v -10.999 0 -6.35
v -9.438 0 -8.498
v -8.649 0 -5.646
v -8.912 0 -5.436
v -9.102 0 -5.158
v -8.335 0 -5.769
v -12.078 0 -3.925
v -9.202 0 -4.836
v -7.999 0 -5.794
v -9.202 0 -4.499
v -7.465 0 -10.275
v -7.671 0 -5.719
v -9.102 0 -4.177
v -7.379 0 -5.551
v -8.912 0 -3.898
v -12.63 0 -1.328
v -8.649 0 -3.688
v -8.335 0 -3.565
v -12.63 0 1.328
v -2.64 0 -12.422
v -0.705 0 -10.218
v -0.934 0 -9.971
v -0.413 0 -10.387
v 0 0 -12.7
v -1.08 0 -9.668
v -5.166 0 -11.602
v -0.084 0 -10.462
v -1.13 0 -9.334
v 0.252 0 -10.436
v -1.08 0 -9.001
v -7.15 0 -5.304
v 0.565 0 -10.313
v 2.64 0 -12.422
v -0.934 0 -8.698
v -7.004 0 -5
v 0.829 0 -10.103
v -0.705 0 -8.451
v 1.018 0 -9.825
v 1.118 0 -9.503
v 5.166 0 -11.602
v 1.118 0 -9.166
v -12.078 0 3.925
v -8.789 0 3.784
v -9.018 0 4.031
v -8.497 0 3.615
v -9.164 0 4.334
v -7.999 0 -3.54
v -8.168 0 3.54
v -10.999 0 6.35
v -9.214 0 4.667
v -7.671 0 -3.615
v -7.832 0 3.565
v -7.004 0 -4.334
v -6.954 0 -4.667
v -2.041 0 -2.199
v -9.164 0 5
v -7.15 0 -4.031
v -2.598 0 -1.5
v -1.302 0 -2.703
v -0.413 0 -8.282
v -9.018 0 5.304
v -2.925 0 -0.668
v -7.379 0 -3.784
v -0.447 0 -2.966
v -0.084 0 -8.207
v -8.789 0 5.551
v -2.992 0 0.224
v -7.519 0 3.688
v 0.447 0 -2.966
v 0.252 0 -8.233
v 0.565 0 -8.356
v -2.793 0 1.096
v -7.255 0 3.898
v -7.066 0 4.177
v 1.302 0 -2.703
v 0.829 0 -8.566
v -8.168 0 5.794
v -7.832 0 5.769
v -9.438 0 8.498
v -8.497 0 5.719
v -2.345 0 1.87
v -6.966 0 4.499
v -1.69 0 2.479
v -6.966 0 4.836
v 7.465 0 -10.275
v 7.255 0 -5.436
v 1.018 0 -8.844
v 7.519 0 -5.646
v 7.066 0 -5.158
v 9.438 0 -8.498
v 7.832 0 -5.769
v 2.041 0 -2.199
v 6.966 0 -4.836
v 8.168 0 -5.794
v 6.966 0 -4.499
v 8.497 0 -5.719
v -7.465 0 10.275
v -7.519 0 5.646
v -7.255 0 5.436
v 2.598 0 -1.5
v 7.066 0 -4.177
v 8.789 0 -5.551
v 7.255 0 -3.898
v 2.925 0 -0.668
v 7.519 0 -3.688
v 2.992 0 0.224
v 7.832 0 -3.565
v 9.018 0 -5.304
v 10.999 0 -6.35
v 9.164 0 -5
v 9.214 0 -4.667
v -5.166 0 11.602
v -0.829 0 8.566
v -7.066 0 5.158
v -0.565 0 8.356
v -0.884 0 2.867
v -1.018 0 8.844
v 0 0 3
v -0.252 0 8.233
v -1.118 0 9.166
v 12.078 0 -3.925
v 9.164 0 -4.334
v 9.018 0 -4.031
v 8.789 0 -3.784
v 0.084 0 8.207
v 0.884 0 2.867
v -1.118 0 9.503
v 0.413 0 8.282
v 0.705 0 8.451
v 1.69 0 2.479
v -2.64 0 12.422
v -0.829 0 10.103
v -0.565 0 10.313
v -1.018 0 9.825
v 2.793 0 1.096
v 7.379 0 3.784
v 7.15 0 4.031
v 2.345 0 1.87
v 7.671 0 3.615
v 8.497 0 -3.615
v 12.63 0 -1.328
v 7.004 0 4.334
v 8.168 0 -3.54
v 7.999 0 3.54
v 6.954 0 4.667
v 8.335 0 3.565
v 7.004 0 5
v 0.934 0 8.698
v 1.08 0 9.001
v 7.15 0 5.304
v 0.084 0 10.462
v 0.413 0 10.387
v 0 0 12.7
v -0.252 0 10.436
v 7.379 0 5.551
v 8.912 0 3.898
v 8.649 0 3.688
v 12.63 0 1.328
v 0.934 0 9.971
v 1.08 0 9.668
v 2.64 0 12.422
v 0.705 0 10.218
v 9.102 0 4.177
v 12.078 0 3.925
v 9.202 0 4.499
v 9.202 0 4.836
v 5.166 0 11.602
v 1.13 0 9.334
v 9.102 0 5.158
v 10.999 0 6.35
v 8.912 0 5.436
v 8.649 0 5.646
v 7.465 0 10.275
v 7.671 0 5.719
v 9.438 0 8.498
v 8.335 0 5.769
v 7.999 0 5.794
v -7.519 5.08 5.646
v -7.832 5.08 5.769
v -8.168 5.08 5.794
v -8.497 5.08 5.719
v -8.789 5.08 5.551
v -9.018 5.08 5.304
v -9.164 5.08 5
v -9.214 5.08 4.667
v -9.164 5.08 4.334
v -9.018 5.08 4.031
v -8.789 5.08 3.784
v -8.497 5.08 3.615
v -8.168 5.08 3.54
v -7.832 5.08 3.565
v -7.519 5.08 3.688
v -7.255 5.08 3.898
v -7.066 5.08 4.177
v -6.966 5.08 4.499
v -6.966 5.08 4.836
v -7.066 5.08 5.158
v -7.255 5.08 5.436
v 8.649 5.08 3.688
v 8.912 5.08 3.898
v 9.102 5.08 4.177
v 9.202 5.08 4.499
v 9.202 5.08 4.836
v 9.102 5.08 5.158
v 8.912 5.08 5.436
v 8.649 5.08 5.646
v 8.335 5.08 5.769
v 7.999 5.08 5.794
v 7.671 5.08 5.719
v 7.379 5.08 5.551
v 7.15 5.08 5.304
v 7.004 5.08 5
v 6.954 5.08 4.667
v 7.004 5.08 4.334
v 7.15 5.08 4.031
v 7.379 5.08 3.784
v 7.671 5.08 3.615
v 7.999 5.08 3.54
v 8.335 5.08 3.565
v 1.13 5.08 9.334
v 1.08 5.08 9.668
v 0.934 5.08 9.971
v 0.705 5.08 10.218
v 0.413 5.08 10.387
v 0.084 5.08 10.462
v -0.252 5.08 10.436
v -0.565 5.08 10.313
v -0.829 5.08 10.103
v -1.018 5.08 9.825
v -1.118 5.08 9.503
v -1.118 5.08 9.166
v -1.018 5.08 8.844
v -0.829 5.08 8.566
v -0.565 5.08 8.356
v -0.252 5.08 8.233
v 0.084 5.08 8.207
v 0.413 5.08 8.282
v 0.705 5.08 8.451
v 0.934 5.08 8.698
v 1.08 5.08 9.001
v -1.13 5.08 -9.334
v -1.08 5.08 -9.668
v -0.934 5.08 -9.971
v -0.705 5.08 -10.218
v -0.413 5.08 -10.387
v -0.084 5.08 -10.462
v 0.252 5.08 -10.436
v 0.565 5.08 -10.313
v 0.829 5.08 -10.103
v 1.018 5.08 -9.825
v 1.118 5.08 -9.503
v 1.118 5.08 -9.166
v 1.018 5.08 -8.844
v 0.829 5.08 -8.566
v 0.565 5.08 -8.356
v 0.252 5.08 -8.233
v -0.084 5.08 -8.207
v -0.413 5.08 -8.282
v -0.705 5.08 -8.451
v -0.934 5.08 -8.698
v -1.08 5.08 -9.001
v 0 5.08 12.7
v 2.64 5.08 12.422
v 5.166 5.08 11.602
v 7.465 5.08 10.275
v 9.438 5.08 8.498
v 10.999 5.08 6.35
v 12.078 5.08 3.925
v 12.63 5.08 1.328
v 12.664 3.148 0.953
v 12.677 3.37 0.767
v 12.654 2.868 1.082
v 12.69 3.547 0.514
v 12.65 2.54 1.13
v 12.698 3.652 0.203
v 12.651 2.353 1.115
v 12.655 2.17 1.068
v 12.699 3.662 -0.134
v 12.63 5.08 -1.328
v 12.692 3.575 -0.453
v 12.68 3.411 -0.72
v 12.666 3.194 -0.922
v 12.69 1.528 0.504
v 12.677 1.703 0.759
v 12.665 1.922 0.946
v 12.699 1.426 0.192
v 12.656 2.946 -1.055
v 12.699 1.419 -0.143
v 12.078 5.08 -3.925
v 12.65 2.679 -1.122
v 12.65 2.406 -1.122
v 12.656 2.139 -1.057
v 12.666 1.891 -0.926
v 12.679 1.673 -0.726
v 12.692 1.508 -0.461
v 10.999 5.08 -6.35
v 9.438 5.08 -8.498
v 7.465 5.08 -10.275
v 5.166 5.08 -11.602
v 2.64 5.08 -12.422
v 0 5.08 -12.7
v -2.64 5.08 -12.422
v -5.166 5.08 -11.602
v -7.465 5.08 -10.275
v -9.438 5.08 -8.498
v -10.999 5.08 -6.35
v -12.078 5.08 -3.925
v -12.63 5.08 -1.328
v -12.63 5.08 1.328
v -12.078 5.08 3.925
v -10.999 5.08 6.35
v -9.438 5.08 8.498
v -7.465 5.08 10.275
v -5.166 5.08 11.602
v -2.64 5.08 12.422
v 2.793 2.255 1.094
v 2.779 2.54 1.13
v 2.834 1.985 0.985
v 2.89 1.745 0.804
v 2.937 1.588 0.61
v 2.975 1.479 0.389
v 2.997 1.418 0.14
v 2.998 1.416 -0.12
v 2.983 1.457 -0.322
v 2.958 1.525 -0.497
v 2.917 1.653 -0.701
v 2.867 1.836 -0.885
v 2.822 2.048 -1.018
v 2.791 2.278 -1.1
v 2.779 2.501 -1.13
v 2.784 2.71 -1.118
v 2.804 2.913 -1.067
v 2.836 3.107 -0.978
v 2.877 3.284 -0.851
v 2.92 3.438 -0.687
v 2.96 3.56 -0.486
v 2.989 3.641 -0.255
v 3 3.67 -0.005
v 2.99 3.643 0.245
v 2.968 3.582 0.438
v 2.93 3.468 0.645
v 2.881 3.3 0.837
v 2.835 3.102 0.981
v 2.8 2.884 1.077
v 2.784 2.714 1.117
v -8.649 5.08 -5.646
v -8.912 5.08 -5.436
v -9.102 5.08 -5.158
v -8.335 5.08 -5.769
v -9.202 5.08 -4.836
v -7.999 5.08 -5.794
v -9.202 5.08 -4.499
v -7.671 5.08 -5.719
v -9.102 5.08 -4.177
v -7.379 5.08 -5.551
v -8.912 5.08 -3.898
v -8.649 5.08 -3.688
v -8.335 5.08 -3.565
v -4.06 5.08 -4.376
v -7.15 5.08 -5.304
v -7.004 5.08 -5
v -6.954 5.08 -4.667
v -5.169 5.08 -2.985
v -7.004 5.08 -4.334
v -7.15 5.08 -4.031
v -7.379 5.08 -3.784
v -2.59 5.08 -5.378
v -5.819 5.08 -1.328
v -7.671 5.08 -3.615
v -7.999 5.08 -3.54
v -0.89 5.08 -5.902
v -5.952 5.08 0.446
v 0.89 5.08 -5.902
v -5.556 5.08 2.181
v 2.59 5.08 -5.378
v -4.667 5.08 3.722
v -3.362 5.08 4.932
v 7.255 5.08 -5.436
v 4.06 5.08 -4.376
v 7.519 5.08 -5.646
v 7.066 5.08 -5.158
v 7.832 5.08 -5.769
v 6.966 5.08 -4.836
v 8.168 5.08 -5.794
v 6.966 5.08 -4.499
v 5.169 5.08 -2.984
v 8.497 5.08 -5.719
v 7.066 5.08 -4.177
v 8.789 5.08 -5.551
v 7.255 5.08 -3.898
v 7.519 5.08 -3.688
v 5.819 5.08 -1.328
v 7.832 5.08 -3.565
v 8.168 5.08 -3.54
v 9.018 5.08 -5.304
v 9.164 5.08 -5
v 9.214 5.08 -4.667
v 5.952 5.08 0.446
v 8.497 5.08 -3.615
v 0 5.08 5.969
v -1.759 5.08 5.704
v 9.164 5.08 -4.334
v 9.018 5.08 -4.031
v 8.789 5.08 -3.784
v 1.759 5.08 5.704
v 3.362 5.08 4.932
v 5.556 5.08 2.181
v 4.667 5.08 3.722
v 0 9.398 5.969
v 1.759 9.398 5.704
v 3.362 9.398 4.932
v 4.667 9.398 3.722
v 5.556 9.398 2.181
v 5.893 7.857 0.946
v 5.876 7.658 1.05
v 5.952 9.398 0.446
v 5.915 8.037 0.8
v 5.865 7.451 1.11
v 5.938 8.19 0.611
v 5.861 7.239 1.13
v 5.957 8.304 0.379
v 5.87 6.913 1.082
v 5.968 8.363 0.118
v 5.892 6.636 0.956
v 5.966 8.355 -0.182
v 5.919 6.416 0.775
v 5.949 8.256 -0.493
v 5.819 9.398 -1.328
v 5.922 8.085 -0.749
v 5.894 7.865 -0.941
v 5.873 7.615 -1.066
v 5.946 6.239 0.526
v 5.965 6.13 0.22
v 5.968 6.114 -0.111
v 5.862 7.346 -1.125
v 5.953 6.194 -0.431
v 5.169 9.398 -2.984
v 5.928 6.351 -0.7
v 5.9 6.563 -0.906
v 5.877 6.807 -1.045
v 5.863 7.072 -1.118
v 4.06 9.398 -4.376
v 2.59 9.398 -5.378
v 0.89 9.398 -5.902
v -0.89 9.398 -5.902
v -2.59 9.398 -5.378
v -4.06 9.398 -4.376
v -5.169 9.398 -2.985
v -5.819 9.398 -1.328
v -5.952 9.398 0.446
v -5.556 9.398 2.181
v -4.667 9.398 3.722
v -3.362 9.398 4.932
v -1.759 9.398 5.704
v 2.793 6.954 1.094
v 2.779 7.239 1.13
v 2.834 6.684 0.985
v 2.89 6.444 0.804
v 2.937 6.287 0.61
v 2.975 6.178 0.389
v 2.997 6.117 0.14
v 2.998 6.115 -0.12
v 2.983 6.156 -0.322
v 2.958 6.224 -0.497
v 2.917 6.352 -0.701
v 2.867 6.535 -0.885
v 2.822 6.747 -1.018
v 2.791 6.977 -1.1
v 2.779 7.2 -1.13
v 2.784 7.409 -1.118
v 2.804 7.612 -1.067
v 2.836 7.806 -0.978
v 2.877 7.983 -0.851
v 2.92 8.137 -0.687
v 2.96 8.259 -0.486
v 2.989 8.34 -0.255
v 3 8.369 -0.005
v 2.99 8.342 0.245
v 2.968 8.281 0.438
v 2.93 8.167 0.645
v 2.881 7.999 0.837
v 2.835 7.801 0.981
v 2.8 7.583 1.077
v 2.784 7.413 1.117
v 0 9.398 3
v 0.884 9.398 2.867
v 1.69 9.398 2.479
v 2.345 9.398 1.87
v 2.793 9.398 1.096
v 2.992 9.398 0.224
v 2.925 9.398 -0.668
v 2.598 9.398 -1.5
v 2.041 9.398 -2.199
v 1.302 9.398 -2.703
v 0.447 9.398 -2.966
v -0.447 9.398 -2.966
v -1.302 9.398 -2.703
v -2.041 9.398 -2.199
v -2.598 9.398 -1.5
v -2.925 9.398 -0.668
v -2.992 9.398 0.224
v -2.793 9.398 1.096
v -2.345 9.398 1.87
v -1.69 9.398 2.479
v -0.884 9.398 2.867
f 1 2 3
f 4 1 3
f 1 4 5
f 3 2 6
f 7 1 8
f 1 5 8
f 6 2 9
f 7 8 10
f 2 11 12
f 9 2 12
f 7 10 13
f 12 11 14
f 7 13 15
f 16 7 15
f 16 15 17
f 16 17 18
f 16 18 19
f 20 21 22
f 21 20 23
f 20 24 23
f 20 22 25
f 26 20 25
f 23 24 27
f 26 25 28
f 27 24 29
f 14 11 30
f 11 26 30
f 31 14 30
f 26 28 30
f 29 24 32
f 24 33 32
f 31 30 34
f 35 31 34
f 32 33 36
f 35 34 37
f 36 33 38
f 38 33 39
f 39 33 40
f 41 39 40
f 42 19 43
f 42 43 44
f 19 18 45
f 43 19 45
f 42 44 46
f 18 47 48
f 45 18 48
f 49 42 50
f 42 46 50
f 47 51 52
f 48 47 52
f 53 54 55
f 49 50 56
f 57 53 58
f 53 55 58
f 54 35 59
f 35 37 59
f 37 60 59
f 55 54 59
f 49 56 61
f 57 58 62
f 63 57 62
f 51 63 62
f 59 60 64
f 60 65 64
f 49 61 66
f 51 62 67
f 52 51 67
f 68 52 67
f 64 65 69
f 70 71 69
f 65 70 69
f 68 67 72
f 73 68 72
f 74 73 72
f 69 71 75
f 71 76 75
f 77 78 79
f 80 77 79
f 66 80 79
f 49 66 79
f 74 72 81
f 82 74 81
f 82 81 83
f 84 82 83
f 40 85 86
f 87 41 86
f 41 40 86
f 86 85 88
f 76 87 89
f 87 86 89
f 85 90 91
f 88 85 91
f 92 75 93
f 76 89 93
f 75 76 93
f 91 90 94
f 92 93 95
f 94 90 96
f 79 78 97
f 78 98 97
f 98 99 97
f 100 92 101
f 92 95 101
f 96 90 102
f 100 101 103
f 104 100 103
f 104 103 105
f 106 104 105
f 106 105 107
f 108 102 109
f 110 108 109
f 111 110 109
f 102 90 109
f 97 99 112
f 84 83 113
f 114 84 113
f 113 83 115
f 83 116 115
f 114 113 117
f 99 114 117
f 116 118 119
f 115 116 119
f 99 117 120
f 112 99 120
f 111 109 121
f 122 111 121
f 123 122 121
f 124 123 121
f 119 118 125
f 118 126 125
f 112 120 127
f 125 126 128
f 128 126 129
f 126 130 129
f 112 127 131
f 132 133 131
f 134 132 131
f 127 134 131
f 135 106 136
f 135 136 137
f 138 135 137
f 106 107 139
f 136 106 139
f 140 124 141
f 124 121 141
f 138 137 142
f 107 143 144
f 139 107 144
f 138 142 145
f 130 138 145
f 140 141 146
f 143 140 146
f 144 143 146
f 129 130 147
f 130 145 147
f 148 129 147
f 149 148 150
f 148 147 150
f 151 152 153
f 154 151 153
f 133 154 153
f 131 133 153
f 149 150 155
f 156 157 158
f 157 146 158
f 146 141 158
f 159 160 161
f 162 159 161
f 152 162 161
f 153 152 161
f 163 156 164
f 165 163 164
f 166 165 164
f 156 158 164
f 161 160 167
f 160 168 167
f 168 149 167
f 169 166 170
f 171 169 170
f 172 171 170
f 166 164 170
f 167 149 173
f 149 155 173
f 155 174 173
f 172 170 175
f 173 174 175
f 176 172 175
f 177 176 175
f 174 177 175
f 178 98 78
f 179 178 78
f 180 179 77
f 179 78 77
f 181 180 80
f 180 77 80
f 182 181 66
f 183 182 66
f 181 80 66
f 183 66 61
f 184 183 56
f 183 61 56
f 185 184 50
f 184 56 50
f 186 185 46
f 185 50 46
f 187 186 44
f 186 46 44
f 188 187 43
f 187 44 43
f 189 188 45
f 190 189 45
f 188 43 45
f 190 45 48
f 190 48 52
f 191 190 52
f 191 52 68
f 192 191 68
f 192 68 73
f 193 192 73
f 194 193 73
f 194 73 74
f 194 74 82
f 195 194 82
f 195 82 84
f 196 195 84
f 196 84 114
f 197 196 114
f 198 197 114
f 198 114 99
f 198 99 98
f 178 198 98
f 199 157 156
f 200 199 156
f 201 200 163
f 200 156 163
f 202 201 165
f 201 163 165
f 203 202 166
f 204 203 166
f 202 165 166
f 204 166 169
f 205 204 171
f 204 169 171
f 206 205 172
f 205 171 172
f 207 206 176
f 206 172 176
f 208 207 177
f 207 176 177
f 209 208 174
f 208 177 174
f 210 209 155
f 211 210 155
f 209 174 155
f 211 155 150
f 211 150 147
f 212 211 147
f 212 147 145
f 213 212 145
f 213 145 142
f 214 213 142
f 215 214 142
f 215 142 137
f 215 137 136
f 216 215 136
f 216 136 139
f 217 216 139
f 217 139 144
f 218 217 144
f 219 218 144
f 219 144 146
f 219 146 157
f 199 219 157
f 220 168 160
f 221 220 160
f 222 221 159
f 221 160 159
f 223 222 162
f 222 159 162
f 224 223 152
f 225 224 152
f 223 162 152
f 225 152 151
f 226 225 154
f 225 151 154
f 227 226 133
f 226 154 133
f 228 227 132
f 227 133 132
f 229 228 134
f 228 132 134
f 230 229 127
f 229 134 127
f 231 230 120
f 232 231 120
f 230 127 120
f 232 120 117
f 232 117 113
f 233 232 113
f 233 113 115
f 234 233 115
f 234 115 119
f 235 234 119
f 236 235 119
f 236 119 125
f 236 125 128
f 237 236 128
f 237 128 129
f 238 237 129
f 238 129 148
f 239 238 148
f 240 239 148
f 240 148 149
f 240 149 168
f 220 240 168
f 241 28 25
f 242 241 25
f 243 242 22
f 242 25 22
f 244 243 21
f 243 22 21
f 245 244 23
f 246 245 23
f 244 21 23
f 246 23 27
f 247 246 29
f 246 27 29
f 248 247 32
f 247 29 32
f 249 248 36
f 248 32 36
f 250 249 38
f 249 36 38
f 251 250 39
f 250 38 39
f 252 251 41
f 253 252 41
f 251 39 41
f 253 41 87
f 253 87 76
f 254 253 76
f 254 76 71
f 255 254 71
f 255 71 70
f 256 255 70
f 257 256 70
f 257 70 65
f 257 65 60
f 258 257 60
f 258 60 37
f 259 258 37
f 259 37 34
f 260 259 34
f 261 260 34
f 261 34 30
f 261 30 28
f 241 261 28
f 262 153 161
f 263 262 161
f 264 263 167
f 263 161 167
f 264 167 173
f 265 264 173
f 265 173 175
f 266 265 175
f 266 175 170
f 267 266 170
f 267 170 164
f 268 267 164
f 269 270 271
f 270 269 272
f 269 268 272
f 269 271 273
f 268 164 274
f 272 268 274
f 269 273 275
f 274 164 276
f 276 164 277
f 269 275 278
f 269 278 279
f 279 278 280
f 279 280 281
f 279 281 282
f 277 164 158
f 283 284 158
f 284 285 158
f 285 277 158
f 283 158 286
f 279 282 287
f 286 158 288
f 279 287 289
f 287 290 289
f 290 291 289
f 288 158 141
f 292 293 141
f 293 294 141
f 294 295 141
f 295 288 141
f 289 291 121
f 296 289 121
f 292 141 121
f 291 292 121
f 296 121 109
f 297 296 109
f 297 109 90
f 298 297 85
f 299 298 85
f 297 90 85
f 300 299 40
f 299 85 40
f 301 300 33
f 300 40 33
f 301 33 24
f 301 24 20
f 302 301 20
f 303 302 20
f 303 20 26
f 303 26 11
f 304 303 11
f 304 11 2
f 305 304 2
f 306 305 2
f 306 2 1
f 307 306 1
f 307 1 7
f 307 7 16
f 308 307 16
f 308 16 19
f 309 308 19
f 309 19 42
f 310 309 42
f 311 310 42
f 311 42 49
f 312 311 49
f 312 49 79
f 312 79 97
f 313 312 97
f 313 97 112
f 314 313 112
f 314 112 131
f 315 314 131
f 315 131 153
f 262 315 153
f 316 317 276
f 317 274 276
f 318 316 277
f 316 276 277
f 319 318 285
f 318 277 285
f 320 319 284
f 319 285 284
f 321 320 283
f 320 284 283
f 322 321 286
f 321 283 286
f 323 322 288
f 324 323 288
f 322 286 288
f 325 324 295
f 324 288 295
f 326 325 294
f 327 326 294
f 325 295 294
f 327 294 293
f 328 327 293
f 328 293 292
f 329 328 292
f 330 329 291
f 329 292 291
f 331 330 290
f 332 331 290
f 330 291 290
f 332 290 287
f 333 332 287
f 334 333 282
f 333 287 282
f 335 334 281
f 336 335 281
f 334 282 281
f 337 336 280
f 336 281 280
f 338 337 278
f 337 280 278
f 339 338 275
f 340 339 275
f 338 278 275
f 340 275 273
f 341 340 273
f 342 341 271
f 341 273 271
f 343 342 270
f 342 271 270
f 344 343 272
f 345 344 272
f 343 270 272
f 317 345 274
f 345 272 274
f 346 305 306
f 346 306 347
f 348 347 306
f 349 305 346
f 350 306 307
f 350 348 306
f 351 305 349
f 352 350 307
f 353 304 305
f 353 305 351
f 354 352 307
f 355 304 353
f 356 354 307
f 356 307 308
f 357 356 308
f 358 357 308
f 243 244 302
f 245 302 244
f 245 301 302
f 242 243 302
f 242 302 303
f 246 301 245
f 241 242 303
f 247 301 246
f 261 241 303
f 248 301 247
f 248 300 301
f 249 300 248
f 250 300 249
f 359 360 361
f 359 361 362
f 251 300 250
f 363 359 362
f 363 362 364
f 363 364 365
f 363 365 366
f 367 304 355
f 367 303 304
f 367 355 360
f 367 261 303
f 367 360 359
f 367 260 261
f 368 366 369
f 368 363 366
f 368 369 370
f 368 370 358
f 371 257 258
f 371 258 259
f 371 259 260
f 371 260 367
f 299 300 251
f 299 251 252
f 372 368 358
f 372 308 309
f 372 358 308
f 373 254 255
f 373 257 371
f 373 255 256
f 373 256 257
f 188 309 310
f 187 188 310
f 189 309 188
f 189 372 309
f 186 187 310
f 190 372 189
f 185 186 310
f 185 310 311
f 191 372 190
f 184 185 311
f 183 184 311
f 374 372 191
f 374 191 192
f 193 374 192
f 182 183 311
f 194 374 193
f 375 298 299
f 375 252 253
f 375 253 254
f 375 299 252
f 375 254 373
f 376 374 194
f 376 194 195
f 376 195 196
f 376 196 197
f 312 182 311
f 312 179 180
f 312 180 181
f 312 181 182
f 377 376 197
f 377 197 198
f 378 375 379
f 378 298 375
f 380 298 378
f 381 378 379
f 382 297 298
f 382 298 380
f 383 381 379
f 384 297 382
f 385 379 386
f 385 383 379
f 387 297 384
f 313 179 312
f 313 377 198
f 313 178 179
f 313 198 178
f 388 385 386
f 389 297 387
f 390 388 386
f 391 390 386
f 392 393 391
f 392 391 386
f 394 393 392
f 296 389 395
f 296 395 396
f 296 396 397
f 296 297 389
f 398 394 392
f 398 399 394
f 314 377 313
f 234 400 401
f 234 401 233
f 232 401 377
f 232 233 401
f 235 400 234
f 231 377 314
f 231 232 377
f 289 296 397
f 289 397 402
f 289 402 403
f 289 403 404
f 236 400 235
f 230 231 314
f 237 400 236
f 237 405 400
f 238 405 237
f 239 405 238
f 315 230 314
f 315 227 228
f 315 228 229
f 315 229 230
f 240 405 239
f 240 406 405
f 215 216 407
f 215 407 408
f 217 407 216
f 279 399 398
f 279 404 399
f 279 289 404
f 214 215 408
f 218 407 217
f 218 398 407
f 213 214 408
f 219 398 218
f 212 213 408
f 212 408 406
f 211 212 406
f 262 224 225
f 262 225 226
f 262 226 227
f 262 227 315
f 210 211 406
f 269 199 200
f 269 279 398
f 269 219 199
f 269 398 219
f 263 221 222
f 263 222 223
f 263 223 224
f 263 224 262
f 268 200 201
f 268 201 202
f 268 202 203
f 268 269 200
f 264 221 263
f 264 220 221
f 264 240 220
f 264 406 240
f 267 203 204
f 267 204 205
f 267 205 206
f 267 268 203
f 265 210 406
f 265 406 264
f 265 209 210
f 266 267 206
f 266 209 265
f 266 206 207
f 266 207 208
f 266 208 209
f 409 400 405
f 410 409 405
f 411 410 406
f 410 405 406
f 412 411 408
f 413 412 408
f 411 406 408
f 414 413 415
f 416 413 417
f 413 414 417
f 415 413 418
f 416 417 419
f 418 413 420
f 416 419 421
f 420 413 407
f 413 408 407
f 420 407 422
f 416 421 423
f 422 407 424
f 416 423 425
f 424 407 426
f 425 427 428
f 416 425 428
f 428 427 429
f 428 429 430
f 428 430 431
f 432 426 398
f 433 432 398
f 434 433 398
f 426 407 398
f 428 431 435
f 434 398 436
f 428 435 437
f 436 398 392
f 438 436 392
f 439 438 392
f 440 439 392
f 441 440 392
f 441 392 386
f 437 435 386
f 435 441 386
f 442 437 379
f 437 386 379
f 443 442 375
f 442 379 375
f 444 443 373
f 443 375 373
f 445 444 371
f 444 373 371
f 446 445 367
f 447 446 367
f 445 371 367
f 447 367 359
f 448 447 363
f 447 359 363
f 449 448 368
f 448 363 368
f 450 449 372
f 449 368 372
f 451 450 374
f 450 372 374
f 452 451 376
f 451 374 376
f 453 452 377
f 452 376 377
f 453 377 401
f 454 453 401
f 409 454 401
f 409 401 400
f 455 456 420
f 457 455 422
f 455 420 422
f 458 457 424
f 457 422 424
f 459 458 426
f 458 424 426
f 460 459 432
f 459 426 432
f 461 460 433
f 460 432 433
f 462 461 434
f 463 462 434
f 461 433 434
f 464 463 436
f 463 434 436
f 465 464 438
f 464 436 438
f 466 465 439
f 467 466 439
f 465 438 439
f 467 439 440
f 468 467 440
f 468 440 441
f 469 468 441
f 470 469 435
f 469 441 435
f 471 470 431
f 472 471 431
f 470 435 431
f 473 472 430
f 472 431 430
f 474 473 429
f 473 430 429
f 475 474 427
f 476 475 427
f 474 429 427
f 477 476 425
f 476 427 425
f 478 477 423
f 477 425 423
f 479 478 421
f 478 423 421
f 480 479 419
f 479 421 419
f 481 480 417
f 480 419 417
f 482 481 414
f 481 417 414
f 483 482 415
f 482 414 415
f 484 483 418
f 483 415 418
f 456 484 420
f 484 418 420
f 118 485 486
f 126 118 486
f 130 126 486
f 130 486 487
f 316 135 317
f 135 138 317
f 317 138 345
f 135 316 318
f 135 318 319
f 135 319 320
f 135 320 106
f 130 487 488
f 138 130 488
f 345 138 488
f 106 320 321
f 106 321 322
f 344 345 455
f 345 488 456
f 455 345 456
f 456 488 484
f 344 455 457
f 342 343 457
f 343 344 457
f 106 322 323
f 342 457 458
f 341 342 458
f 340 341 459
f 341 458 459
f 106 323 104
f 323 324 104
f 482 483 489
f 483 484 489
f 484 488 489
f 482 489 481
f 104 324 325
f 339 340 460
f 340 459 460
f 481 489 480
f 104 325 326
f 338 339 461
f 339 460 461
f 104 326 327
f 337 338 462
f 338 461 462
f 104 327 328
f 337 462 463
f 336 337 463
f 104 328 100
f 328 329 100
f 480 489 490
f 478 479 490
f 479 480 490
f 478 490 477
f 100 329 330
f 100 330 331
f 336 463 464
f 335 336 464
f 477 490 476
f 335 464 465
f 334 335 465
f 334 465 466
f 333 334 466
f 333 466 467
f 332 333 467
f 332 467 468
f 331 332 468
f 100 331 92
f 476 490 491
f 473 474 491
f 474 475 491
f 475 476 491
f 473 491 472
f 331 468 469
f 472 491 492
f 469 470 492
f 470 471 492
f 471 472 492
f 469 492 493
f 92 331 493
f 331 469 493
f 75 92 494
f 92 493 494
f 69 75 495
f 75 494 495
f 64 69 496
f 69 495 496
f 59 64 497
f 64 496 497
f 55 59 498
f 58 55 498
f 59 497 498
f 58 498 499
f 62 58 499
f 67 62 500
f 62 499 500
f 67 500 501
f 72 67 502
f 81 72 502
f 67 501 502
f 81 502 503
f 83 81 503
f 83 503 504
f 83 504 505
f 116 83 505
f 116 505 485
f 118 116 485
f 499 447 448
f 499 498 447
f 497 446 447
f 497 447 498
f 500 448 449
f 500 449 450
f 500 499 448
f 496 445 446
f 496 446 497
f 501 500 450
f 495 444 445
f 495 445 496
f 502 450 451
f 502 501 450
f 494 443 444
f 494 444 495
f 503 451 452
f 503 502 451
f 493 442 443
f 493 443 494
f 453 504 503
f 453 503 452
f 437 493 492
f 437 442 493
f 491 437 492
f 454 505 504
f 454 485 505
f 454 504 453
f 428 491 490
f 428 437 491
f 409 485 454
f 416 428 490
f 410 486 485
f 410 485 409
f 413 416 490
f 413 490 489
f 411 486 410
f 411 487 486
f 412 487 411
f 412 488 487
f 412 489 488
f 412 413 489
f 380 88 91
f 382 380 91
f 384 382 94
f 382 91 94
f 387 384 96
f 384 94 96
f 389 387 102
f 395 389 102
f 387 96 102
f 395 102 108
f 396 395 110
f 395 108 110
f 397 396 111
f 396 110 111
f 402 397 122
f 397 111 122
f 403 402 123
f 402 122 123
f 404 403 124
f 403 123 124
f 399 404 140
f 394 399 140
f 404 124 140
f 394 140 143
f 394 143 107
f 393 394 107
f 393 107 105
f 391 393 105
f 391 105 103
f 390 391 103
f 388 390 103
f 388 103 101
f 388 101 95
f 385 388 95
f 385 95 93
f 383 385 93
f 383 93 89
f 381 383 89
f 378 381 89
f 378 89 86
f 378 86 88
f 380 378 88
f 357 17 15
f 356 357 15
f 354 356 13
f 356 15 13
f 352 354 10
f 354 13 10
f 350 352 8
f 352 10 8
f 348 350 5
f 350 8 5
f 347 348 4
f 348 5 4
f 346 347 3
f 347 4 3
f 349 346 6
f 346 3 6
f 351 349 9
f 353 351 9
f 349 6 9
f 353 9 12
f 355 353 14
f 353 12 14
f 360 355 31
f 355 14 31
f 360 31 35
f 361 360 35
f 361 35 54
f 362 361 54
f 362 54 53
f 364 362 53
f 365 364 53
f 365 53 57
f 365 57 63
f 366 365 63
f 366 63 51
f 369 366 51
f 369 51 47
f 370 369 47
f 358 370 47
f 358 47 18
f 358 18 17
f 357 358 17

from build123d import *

# Parameters (mm, degrees)
SKETCH8_R                      = 12.7
BOSS_EXTRUDE6_DEPTH            = 5.08
SKETCH9_R                      = 5.969
BOSS_EXTRUDE7_DEPTH            = 4.318
F_4_40_TAPPED_HOLE1_D          = 2.2606
CIRPATTERN1_COUNT              = 6
SKETCH12_R                     = 3
CUT_EXTRUDE2_DEPTH             = 21.270727762
SKETCH13_W                     = 1.1303
SKETCH13_H                     = 12.7
F_4_40_TAPPED_HOLE2_AT_2_COUNT = 2
F_4_40_TAPPED_HOLE2_AT_2_PITCH = 4.699


with BuildPart() as part:
    # Sketch8 → Boss-Extrude6 (new body)
    with BuildSketch(Plane(origin=(0, 0, 0), x_dir=(1, 0, 0), z_dir=(0, 1, 0))):
        with Locations(Location((0, 0, 0), (0, 0, 270))):
            Circle(SKETCH8_R)
    extrude(amount=BOSS_EXTRUDE6_DEPTH)

    # Sketch9 → Boss-Extrude7 (add)
    with BuildSketch(Plane(origin=(0, 5.08, 0), x_dir=(1, 0, 0), z_dir=(0, 1, 0))):
        with Locations(Location((0, 0, 0), (0, 0, 270))):
            Circle(SKETCH9_R)
    extrude(amount=BOSS_EXTRUDE7_DEPTH)

    # #4-40 Tapped Hole1 (through all)
    with Locations(Plane(origin=(0, 5.08, 0), x_dir=(1, 0, 0), z_dir=(0, 1, 0))):
        with Locations((0, 9.3345)):
            f_4_40_tapped_hole1 = Hole(F_4_40_TAPPED_HOLE1_D / 2)

    # CirPattern1: #4-40 Tapped Hole1 ×6 about axis
    cirpattern1_axis = Axis((0, 0, 0), (0, 1, 0))
    for i in range(1, CIRPATTERN1_COUNT):
        add(f_4_40_tapped_hole1.rotate(cirpattern1_axis, i * 360 / CIRPATTERN1_COUNT), mode=Mode.SUBTRACT)

    # Sketch12 → Cut-Extrude2 (cut, through all)
    with BuildSketch(Plane(origin=(0, 9.398, 0), x_dir=(1, 0, 0), z_dir=(0, 1, 0))):
        with Locations(Location((0, 0, 0), (0, 0, 270))):
            Circle(SKETCH12_R)
    extrude(amount=-CUT_EXTRUDE2_DEPTH, mode=Mode.SUBTRACT)

    # Sketch13 → #4-40 Tapped Hole2 (revolve, cut)
    with BuildSketch(Plane.ZX.offset(7.239)):
        with Locations((0.56515, 6.35)):
            Rectangle(SKETCH13_W, SKETCH13_H)
    f_4_40_tapped_hole2 = revolve(axis=Axis((-6.35, 7.239, 0), (1, 0, 0)), mode=Mode.SUBTRACT)

    # #4-40 Tapped Hole2 at 2: #4-40 Tapped Hole2 ×2
    with Locations(*[(0, -i * F_4_40_TAPPED_HOLE2_AT_2_PITCH, 0) for i in range(1, F_4_40_TAPPED_HOLE2_AT_2_COUNT)]):
        add(f_4_40_tapped_hole2, mode=Mode.SUBTRACT)


solid = part.part
